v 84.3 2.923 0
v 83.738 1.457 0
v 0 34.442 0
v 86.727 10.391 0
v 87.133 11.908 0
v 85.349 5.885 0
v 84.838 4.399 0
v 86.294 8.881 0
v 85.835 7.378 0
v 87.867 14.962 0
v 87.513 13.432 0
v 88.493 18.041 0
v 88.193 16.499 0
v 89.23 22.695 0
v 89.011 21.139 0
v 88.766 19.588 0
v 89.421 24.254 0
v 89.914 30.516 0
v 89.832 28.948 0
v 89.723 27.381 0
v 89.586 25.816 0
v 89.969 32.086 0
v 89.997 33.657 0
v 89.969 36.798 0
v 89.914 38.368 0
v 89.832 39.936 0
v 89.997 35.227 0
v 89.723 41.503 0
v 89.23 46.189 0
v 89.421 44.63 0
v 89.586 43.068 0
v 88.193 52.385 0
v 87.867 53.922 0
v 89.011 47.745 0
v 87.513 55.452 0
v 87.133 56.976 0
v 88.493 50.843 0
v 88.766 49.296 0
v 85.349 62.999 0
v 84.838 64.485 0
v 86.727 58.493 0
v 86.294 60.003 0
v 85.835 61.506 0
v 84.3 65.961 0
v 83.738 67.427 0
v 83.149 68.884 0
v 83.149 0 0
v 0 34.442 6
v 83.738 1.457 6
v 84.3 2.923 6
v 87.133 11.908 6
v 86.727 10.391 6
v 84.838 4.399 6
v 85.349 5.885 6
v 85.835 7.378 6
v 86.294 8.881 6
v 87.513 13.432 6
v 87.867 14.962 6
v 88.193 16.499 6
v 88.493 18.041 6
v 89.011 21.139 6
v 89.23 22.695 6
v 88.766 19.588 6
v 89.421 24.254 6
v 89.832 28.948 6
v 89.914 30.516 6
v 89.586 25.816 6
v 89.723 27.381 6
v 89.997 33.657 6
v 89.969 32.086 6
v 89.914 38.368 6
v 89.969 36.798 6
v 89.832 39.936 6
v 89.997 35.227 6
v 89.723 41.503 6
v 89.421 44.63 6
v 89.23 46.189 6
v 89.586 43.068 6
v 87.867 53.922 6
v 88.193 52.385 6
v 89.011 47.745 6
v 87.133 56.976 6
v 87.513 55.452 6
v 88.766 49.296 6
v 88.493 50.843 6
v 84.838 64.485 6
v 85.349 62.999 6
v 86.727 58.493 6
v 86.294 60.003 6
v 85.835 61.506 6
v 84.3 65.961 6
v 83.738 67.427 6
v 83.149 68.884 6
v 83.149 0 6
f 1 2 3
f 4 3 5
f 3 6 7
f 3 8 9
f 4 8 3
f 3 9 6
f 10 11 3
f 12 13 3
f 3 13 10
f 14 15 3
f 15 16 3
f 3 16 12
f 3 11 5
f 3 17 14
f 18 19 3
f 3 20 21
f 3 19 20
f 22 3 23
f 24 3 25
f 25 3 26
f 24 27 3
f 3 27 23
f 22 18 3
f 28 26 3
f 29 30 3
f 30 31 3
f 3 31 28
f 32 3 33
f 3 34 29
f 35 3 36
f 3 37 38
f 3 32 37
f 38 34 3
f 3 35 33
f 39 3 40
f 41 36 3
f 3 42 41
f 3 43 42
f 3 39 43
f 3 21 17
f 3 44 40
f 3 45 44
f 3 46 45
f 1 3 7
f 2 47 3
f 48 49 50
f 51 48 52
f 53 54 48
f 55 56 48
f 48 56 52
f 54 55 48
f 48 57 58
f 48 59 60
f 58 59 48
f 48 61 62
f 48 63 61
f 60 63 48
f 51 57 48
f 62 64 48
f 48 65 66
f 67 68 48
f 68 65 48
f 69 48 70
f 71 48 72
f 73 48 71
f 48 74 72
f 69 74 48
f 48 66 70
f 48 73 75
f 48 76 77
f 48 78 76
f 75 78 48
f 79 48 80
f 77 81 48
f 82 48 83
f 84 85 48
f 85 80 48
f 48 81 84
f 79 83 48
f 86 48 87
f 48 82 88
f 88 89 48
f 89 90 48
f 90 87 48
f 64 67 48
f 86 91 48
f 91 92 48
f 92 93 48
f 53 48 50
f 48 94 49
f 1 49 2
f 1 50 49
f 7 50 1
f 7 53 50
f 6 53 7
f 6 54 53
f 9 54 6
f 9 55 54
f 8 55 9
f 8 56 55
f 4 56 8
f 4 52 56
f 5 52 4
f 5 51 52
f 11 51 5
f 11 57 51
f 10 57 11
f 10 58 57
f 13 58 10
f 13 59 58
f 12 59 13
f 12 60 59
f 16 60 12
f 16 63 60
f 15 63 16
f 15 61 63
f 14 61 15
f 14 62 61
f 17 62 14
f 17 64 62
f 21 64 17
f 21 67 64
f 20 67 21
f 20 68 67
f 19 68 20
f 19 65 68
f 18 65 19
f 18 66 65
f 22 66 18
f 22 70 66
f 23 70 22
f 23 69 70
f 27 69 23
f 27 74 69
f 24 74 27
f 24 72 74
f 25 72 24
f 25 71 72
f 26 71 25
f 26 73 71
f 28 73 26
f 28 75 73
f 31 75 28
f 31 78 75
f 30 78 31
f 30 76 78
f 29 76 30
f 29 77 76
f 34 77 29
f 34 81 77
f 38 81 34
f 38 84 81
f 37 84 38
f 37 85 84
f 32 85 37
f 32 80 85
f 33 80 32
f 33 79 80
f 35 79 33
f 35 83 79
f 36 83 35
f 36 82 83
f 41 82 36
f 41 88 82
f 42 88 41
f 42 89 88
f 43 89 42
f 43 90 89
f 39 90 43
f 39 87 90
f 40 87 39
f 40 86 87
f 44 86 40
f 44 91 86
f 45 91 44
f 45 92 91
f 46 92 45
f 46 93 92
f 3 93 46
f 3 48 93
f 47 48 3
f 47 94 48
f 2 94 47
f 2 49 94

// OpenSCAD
$fn = 32;

// ----------------------------------------------------------------------
// Arc profile plate: sector, 47 points
// ----------------------------------------------------------------------

// --- parameters (mm) ---
sector_angle = 45;        // sector angle, degrees
sector_r = 90;            // outer radius
arc_step = 1;             // sampling step of the arc, degrees
plate_t = 6;              // plate thickness, Z

bbox_x = 2 * sector_r * sin(sector_angle / 2);  // chord of the sector
bbox_y = sector_r;  // depth of the sector (apex to arc)

profile = [[83.149, 0], [83.738, 1.457], [84.3, 2.923], [84.838, 4.399], [85.349, 5.885], [85.835, 7.378], [86.294, 8.881], [86.727, 10.391], [87.133, 11.908], [87.513, 13.432], [87.867, 14.962], [88.193, 16.499], [88.493, 18.041], [88.766, 19.588], [89.011, 21.139], [89.23, 22.695], [89.421, 24.254], [89.586, 25.816], [89.723, 27.381], [89.832, 28.948], [89.914, 30.516], [89.969, 32.086], [89.997, 33.657], [89.997, 35.227], [89.969, 36.798], [89.914, 38.368], [89.832, 39.936], [89.723, 41.503], [89.586, 43.068], [89.421, 44.63], [89.23, 46.189], [89.011, 47.745], [88.766, 49.296], [88.493, 50.843], [88.193, 52.385], [87.867, 53.922], [87.513, 55.452], [87.133, 56.976], [86.727, 58.493], [86.294, 60.003], [85.835, 61.506], [85.349, 62.999], [84.838, 64.485], [84.3, 65.961], [83.738, 67.427], [83.149, 68.884], [0, 34.442]];  // primary outline, 47 points, counter clockwise

// --- the one profile operation ---
linear_extrude(height = plate_t) polygon(points = profile);
